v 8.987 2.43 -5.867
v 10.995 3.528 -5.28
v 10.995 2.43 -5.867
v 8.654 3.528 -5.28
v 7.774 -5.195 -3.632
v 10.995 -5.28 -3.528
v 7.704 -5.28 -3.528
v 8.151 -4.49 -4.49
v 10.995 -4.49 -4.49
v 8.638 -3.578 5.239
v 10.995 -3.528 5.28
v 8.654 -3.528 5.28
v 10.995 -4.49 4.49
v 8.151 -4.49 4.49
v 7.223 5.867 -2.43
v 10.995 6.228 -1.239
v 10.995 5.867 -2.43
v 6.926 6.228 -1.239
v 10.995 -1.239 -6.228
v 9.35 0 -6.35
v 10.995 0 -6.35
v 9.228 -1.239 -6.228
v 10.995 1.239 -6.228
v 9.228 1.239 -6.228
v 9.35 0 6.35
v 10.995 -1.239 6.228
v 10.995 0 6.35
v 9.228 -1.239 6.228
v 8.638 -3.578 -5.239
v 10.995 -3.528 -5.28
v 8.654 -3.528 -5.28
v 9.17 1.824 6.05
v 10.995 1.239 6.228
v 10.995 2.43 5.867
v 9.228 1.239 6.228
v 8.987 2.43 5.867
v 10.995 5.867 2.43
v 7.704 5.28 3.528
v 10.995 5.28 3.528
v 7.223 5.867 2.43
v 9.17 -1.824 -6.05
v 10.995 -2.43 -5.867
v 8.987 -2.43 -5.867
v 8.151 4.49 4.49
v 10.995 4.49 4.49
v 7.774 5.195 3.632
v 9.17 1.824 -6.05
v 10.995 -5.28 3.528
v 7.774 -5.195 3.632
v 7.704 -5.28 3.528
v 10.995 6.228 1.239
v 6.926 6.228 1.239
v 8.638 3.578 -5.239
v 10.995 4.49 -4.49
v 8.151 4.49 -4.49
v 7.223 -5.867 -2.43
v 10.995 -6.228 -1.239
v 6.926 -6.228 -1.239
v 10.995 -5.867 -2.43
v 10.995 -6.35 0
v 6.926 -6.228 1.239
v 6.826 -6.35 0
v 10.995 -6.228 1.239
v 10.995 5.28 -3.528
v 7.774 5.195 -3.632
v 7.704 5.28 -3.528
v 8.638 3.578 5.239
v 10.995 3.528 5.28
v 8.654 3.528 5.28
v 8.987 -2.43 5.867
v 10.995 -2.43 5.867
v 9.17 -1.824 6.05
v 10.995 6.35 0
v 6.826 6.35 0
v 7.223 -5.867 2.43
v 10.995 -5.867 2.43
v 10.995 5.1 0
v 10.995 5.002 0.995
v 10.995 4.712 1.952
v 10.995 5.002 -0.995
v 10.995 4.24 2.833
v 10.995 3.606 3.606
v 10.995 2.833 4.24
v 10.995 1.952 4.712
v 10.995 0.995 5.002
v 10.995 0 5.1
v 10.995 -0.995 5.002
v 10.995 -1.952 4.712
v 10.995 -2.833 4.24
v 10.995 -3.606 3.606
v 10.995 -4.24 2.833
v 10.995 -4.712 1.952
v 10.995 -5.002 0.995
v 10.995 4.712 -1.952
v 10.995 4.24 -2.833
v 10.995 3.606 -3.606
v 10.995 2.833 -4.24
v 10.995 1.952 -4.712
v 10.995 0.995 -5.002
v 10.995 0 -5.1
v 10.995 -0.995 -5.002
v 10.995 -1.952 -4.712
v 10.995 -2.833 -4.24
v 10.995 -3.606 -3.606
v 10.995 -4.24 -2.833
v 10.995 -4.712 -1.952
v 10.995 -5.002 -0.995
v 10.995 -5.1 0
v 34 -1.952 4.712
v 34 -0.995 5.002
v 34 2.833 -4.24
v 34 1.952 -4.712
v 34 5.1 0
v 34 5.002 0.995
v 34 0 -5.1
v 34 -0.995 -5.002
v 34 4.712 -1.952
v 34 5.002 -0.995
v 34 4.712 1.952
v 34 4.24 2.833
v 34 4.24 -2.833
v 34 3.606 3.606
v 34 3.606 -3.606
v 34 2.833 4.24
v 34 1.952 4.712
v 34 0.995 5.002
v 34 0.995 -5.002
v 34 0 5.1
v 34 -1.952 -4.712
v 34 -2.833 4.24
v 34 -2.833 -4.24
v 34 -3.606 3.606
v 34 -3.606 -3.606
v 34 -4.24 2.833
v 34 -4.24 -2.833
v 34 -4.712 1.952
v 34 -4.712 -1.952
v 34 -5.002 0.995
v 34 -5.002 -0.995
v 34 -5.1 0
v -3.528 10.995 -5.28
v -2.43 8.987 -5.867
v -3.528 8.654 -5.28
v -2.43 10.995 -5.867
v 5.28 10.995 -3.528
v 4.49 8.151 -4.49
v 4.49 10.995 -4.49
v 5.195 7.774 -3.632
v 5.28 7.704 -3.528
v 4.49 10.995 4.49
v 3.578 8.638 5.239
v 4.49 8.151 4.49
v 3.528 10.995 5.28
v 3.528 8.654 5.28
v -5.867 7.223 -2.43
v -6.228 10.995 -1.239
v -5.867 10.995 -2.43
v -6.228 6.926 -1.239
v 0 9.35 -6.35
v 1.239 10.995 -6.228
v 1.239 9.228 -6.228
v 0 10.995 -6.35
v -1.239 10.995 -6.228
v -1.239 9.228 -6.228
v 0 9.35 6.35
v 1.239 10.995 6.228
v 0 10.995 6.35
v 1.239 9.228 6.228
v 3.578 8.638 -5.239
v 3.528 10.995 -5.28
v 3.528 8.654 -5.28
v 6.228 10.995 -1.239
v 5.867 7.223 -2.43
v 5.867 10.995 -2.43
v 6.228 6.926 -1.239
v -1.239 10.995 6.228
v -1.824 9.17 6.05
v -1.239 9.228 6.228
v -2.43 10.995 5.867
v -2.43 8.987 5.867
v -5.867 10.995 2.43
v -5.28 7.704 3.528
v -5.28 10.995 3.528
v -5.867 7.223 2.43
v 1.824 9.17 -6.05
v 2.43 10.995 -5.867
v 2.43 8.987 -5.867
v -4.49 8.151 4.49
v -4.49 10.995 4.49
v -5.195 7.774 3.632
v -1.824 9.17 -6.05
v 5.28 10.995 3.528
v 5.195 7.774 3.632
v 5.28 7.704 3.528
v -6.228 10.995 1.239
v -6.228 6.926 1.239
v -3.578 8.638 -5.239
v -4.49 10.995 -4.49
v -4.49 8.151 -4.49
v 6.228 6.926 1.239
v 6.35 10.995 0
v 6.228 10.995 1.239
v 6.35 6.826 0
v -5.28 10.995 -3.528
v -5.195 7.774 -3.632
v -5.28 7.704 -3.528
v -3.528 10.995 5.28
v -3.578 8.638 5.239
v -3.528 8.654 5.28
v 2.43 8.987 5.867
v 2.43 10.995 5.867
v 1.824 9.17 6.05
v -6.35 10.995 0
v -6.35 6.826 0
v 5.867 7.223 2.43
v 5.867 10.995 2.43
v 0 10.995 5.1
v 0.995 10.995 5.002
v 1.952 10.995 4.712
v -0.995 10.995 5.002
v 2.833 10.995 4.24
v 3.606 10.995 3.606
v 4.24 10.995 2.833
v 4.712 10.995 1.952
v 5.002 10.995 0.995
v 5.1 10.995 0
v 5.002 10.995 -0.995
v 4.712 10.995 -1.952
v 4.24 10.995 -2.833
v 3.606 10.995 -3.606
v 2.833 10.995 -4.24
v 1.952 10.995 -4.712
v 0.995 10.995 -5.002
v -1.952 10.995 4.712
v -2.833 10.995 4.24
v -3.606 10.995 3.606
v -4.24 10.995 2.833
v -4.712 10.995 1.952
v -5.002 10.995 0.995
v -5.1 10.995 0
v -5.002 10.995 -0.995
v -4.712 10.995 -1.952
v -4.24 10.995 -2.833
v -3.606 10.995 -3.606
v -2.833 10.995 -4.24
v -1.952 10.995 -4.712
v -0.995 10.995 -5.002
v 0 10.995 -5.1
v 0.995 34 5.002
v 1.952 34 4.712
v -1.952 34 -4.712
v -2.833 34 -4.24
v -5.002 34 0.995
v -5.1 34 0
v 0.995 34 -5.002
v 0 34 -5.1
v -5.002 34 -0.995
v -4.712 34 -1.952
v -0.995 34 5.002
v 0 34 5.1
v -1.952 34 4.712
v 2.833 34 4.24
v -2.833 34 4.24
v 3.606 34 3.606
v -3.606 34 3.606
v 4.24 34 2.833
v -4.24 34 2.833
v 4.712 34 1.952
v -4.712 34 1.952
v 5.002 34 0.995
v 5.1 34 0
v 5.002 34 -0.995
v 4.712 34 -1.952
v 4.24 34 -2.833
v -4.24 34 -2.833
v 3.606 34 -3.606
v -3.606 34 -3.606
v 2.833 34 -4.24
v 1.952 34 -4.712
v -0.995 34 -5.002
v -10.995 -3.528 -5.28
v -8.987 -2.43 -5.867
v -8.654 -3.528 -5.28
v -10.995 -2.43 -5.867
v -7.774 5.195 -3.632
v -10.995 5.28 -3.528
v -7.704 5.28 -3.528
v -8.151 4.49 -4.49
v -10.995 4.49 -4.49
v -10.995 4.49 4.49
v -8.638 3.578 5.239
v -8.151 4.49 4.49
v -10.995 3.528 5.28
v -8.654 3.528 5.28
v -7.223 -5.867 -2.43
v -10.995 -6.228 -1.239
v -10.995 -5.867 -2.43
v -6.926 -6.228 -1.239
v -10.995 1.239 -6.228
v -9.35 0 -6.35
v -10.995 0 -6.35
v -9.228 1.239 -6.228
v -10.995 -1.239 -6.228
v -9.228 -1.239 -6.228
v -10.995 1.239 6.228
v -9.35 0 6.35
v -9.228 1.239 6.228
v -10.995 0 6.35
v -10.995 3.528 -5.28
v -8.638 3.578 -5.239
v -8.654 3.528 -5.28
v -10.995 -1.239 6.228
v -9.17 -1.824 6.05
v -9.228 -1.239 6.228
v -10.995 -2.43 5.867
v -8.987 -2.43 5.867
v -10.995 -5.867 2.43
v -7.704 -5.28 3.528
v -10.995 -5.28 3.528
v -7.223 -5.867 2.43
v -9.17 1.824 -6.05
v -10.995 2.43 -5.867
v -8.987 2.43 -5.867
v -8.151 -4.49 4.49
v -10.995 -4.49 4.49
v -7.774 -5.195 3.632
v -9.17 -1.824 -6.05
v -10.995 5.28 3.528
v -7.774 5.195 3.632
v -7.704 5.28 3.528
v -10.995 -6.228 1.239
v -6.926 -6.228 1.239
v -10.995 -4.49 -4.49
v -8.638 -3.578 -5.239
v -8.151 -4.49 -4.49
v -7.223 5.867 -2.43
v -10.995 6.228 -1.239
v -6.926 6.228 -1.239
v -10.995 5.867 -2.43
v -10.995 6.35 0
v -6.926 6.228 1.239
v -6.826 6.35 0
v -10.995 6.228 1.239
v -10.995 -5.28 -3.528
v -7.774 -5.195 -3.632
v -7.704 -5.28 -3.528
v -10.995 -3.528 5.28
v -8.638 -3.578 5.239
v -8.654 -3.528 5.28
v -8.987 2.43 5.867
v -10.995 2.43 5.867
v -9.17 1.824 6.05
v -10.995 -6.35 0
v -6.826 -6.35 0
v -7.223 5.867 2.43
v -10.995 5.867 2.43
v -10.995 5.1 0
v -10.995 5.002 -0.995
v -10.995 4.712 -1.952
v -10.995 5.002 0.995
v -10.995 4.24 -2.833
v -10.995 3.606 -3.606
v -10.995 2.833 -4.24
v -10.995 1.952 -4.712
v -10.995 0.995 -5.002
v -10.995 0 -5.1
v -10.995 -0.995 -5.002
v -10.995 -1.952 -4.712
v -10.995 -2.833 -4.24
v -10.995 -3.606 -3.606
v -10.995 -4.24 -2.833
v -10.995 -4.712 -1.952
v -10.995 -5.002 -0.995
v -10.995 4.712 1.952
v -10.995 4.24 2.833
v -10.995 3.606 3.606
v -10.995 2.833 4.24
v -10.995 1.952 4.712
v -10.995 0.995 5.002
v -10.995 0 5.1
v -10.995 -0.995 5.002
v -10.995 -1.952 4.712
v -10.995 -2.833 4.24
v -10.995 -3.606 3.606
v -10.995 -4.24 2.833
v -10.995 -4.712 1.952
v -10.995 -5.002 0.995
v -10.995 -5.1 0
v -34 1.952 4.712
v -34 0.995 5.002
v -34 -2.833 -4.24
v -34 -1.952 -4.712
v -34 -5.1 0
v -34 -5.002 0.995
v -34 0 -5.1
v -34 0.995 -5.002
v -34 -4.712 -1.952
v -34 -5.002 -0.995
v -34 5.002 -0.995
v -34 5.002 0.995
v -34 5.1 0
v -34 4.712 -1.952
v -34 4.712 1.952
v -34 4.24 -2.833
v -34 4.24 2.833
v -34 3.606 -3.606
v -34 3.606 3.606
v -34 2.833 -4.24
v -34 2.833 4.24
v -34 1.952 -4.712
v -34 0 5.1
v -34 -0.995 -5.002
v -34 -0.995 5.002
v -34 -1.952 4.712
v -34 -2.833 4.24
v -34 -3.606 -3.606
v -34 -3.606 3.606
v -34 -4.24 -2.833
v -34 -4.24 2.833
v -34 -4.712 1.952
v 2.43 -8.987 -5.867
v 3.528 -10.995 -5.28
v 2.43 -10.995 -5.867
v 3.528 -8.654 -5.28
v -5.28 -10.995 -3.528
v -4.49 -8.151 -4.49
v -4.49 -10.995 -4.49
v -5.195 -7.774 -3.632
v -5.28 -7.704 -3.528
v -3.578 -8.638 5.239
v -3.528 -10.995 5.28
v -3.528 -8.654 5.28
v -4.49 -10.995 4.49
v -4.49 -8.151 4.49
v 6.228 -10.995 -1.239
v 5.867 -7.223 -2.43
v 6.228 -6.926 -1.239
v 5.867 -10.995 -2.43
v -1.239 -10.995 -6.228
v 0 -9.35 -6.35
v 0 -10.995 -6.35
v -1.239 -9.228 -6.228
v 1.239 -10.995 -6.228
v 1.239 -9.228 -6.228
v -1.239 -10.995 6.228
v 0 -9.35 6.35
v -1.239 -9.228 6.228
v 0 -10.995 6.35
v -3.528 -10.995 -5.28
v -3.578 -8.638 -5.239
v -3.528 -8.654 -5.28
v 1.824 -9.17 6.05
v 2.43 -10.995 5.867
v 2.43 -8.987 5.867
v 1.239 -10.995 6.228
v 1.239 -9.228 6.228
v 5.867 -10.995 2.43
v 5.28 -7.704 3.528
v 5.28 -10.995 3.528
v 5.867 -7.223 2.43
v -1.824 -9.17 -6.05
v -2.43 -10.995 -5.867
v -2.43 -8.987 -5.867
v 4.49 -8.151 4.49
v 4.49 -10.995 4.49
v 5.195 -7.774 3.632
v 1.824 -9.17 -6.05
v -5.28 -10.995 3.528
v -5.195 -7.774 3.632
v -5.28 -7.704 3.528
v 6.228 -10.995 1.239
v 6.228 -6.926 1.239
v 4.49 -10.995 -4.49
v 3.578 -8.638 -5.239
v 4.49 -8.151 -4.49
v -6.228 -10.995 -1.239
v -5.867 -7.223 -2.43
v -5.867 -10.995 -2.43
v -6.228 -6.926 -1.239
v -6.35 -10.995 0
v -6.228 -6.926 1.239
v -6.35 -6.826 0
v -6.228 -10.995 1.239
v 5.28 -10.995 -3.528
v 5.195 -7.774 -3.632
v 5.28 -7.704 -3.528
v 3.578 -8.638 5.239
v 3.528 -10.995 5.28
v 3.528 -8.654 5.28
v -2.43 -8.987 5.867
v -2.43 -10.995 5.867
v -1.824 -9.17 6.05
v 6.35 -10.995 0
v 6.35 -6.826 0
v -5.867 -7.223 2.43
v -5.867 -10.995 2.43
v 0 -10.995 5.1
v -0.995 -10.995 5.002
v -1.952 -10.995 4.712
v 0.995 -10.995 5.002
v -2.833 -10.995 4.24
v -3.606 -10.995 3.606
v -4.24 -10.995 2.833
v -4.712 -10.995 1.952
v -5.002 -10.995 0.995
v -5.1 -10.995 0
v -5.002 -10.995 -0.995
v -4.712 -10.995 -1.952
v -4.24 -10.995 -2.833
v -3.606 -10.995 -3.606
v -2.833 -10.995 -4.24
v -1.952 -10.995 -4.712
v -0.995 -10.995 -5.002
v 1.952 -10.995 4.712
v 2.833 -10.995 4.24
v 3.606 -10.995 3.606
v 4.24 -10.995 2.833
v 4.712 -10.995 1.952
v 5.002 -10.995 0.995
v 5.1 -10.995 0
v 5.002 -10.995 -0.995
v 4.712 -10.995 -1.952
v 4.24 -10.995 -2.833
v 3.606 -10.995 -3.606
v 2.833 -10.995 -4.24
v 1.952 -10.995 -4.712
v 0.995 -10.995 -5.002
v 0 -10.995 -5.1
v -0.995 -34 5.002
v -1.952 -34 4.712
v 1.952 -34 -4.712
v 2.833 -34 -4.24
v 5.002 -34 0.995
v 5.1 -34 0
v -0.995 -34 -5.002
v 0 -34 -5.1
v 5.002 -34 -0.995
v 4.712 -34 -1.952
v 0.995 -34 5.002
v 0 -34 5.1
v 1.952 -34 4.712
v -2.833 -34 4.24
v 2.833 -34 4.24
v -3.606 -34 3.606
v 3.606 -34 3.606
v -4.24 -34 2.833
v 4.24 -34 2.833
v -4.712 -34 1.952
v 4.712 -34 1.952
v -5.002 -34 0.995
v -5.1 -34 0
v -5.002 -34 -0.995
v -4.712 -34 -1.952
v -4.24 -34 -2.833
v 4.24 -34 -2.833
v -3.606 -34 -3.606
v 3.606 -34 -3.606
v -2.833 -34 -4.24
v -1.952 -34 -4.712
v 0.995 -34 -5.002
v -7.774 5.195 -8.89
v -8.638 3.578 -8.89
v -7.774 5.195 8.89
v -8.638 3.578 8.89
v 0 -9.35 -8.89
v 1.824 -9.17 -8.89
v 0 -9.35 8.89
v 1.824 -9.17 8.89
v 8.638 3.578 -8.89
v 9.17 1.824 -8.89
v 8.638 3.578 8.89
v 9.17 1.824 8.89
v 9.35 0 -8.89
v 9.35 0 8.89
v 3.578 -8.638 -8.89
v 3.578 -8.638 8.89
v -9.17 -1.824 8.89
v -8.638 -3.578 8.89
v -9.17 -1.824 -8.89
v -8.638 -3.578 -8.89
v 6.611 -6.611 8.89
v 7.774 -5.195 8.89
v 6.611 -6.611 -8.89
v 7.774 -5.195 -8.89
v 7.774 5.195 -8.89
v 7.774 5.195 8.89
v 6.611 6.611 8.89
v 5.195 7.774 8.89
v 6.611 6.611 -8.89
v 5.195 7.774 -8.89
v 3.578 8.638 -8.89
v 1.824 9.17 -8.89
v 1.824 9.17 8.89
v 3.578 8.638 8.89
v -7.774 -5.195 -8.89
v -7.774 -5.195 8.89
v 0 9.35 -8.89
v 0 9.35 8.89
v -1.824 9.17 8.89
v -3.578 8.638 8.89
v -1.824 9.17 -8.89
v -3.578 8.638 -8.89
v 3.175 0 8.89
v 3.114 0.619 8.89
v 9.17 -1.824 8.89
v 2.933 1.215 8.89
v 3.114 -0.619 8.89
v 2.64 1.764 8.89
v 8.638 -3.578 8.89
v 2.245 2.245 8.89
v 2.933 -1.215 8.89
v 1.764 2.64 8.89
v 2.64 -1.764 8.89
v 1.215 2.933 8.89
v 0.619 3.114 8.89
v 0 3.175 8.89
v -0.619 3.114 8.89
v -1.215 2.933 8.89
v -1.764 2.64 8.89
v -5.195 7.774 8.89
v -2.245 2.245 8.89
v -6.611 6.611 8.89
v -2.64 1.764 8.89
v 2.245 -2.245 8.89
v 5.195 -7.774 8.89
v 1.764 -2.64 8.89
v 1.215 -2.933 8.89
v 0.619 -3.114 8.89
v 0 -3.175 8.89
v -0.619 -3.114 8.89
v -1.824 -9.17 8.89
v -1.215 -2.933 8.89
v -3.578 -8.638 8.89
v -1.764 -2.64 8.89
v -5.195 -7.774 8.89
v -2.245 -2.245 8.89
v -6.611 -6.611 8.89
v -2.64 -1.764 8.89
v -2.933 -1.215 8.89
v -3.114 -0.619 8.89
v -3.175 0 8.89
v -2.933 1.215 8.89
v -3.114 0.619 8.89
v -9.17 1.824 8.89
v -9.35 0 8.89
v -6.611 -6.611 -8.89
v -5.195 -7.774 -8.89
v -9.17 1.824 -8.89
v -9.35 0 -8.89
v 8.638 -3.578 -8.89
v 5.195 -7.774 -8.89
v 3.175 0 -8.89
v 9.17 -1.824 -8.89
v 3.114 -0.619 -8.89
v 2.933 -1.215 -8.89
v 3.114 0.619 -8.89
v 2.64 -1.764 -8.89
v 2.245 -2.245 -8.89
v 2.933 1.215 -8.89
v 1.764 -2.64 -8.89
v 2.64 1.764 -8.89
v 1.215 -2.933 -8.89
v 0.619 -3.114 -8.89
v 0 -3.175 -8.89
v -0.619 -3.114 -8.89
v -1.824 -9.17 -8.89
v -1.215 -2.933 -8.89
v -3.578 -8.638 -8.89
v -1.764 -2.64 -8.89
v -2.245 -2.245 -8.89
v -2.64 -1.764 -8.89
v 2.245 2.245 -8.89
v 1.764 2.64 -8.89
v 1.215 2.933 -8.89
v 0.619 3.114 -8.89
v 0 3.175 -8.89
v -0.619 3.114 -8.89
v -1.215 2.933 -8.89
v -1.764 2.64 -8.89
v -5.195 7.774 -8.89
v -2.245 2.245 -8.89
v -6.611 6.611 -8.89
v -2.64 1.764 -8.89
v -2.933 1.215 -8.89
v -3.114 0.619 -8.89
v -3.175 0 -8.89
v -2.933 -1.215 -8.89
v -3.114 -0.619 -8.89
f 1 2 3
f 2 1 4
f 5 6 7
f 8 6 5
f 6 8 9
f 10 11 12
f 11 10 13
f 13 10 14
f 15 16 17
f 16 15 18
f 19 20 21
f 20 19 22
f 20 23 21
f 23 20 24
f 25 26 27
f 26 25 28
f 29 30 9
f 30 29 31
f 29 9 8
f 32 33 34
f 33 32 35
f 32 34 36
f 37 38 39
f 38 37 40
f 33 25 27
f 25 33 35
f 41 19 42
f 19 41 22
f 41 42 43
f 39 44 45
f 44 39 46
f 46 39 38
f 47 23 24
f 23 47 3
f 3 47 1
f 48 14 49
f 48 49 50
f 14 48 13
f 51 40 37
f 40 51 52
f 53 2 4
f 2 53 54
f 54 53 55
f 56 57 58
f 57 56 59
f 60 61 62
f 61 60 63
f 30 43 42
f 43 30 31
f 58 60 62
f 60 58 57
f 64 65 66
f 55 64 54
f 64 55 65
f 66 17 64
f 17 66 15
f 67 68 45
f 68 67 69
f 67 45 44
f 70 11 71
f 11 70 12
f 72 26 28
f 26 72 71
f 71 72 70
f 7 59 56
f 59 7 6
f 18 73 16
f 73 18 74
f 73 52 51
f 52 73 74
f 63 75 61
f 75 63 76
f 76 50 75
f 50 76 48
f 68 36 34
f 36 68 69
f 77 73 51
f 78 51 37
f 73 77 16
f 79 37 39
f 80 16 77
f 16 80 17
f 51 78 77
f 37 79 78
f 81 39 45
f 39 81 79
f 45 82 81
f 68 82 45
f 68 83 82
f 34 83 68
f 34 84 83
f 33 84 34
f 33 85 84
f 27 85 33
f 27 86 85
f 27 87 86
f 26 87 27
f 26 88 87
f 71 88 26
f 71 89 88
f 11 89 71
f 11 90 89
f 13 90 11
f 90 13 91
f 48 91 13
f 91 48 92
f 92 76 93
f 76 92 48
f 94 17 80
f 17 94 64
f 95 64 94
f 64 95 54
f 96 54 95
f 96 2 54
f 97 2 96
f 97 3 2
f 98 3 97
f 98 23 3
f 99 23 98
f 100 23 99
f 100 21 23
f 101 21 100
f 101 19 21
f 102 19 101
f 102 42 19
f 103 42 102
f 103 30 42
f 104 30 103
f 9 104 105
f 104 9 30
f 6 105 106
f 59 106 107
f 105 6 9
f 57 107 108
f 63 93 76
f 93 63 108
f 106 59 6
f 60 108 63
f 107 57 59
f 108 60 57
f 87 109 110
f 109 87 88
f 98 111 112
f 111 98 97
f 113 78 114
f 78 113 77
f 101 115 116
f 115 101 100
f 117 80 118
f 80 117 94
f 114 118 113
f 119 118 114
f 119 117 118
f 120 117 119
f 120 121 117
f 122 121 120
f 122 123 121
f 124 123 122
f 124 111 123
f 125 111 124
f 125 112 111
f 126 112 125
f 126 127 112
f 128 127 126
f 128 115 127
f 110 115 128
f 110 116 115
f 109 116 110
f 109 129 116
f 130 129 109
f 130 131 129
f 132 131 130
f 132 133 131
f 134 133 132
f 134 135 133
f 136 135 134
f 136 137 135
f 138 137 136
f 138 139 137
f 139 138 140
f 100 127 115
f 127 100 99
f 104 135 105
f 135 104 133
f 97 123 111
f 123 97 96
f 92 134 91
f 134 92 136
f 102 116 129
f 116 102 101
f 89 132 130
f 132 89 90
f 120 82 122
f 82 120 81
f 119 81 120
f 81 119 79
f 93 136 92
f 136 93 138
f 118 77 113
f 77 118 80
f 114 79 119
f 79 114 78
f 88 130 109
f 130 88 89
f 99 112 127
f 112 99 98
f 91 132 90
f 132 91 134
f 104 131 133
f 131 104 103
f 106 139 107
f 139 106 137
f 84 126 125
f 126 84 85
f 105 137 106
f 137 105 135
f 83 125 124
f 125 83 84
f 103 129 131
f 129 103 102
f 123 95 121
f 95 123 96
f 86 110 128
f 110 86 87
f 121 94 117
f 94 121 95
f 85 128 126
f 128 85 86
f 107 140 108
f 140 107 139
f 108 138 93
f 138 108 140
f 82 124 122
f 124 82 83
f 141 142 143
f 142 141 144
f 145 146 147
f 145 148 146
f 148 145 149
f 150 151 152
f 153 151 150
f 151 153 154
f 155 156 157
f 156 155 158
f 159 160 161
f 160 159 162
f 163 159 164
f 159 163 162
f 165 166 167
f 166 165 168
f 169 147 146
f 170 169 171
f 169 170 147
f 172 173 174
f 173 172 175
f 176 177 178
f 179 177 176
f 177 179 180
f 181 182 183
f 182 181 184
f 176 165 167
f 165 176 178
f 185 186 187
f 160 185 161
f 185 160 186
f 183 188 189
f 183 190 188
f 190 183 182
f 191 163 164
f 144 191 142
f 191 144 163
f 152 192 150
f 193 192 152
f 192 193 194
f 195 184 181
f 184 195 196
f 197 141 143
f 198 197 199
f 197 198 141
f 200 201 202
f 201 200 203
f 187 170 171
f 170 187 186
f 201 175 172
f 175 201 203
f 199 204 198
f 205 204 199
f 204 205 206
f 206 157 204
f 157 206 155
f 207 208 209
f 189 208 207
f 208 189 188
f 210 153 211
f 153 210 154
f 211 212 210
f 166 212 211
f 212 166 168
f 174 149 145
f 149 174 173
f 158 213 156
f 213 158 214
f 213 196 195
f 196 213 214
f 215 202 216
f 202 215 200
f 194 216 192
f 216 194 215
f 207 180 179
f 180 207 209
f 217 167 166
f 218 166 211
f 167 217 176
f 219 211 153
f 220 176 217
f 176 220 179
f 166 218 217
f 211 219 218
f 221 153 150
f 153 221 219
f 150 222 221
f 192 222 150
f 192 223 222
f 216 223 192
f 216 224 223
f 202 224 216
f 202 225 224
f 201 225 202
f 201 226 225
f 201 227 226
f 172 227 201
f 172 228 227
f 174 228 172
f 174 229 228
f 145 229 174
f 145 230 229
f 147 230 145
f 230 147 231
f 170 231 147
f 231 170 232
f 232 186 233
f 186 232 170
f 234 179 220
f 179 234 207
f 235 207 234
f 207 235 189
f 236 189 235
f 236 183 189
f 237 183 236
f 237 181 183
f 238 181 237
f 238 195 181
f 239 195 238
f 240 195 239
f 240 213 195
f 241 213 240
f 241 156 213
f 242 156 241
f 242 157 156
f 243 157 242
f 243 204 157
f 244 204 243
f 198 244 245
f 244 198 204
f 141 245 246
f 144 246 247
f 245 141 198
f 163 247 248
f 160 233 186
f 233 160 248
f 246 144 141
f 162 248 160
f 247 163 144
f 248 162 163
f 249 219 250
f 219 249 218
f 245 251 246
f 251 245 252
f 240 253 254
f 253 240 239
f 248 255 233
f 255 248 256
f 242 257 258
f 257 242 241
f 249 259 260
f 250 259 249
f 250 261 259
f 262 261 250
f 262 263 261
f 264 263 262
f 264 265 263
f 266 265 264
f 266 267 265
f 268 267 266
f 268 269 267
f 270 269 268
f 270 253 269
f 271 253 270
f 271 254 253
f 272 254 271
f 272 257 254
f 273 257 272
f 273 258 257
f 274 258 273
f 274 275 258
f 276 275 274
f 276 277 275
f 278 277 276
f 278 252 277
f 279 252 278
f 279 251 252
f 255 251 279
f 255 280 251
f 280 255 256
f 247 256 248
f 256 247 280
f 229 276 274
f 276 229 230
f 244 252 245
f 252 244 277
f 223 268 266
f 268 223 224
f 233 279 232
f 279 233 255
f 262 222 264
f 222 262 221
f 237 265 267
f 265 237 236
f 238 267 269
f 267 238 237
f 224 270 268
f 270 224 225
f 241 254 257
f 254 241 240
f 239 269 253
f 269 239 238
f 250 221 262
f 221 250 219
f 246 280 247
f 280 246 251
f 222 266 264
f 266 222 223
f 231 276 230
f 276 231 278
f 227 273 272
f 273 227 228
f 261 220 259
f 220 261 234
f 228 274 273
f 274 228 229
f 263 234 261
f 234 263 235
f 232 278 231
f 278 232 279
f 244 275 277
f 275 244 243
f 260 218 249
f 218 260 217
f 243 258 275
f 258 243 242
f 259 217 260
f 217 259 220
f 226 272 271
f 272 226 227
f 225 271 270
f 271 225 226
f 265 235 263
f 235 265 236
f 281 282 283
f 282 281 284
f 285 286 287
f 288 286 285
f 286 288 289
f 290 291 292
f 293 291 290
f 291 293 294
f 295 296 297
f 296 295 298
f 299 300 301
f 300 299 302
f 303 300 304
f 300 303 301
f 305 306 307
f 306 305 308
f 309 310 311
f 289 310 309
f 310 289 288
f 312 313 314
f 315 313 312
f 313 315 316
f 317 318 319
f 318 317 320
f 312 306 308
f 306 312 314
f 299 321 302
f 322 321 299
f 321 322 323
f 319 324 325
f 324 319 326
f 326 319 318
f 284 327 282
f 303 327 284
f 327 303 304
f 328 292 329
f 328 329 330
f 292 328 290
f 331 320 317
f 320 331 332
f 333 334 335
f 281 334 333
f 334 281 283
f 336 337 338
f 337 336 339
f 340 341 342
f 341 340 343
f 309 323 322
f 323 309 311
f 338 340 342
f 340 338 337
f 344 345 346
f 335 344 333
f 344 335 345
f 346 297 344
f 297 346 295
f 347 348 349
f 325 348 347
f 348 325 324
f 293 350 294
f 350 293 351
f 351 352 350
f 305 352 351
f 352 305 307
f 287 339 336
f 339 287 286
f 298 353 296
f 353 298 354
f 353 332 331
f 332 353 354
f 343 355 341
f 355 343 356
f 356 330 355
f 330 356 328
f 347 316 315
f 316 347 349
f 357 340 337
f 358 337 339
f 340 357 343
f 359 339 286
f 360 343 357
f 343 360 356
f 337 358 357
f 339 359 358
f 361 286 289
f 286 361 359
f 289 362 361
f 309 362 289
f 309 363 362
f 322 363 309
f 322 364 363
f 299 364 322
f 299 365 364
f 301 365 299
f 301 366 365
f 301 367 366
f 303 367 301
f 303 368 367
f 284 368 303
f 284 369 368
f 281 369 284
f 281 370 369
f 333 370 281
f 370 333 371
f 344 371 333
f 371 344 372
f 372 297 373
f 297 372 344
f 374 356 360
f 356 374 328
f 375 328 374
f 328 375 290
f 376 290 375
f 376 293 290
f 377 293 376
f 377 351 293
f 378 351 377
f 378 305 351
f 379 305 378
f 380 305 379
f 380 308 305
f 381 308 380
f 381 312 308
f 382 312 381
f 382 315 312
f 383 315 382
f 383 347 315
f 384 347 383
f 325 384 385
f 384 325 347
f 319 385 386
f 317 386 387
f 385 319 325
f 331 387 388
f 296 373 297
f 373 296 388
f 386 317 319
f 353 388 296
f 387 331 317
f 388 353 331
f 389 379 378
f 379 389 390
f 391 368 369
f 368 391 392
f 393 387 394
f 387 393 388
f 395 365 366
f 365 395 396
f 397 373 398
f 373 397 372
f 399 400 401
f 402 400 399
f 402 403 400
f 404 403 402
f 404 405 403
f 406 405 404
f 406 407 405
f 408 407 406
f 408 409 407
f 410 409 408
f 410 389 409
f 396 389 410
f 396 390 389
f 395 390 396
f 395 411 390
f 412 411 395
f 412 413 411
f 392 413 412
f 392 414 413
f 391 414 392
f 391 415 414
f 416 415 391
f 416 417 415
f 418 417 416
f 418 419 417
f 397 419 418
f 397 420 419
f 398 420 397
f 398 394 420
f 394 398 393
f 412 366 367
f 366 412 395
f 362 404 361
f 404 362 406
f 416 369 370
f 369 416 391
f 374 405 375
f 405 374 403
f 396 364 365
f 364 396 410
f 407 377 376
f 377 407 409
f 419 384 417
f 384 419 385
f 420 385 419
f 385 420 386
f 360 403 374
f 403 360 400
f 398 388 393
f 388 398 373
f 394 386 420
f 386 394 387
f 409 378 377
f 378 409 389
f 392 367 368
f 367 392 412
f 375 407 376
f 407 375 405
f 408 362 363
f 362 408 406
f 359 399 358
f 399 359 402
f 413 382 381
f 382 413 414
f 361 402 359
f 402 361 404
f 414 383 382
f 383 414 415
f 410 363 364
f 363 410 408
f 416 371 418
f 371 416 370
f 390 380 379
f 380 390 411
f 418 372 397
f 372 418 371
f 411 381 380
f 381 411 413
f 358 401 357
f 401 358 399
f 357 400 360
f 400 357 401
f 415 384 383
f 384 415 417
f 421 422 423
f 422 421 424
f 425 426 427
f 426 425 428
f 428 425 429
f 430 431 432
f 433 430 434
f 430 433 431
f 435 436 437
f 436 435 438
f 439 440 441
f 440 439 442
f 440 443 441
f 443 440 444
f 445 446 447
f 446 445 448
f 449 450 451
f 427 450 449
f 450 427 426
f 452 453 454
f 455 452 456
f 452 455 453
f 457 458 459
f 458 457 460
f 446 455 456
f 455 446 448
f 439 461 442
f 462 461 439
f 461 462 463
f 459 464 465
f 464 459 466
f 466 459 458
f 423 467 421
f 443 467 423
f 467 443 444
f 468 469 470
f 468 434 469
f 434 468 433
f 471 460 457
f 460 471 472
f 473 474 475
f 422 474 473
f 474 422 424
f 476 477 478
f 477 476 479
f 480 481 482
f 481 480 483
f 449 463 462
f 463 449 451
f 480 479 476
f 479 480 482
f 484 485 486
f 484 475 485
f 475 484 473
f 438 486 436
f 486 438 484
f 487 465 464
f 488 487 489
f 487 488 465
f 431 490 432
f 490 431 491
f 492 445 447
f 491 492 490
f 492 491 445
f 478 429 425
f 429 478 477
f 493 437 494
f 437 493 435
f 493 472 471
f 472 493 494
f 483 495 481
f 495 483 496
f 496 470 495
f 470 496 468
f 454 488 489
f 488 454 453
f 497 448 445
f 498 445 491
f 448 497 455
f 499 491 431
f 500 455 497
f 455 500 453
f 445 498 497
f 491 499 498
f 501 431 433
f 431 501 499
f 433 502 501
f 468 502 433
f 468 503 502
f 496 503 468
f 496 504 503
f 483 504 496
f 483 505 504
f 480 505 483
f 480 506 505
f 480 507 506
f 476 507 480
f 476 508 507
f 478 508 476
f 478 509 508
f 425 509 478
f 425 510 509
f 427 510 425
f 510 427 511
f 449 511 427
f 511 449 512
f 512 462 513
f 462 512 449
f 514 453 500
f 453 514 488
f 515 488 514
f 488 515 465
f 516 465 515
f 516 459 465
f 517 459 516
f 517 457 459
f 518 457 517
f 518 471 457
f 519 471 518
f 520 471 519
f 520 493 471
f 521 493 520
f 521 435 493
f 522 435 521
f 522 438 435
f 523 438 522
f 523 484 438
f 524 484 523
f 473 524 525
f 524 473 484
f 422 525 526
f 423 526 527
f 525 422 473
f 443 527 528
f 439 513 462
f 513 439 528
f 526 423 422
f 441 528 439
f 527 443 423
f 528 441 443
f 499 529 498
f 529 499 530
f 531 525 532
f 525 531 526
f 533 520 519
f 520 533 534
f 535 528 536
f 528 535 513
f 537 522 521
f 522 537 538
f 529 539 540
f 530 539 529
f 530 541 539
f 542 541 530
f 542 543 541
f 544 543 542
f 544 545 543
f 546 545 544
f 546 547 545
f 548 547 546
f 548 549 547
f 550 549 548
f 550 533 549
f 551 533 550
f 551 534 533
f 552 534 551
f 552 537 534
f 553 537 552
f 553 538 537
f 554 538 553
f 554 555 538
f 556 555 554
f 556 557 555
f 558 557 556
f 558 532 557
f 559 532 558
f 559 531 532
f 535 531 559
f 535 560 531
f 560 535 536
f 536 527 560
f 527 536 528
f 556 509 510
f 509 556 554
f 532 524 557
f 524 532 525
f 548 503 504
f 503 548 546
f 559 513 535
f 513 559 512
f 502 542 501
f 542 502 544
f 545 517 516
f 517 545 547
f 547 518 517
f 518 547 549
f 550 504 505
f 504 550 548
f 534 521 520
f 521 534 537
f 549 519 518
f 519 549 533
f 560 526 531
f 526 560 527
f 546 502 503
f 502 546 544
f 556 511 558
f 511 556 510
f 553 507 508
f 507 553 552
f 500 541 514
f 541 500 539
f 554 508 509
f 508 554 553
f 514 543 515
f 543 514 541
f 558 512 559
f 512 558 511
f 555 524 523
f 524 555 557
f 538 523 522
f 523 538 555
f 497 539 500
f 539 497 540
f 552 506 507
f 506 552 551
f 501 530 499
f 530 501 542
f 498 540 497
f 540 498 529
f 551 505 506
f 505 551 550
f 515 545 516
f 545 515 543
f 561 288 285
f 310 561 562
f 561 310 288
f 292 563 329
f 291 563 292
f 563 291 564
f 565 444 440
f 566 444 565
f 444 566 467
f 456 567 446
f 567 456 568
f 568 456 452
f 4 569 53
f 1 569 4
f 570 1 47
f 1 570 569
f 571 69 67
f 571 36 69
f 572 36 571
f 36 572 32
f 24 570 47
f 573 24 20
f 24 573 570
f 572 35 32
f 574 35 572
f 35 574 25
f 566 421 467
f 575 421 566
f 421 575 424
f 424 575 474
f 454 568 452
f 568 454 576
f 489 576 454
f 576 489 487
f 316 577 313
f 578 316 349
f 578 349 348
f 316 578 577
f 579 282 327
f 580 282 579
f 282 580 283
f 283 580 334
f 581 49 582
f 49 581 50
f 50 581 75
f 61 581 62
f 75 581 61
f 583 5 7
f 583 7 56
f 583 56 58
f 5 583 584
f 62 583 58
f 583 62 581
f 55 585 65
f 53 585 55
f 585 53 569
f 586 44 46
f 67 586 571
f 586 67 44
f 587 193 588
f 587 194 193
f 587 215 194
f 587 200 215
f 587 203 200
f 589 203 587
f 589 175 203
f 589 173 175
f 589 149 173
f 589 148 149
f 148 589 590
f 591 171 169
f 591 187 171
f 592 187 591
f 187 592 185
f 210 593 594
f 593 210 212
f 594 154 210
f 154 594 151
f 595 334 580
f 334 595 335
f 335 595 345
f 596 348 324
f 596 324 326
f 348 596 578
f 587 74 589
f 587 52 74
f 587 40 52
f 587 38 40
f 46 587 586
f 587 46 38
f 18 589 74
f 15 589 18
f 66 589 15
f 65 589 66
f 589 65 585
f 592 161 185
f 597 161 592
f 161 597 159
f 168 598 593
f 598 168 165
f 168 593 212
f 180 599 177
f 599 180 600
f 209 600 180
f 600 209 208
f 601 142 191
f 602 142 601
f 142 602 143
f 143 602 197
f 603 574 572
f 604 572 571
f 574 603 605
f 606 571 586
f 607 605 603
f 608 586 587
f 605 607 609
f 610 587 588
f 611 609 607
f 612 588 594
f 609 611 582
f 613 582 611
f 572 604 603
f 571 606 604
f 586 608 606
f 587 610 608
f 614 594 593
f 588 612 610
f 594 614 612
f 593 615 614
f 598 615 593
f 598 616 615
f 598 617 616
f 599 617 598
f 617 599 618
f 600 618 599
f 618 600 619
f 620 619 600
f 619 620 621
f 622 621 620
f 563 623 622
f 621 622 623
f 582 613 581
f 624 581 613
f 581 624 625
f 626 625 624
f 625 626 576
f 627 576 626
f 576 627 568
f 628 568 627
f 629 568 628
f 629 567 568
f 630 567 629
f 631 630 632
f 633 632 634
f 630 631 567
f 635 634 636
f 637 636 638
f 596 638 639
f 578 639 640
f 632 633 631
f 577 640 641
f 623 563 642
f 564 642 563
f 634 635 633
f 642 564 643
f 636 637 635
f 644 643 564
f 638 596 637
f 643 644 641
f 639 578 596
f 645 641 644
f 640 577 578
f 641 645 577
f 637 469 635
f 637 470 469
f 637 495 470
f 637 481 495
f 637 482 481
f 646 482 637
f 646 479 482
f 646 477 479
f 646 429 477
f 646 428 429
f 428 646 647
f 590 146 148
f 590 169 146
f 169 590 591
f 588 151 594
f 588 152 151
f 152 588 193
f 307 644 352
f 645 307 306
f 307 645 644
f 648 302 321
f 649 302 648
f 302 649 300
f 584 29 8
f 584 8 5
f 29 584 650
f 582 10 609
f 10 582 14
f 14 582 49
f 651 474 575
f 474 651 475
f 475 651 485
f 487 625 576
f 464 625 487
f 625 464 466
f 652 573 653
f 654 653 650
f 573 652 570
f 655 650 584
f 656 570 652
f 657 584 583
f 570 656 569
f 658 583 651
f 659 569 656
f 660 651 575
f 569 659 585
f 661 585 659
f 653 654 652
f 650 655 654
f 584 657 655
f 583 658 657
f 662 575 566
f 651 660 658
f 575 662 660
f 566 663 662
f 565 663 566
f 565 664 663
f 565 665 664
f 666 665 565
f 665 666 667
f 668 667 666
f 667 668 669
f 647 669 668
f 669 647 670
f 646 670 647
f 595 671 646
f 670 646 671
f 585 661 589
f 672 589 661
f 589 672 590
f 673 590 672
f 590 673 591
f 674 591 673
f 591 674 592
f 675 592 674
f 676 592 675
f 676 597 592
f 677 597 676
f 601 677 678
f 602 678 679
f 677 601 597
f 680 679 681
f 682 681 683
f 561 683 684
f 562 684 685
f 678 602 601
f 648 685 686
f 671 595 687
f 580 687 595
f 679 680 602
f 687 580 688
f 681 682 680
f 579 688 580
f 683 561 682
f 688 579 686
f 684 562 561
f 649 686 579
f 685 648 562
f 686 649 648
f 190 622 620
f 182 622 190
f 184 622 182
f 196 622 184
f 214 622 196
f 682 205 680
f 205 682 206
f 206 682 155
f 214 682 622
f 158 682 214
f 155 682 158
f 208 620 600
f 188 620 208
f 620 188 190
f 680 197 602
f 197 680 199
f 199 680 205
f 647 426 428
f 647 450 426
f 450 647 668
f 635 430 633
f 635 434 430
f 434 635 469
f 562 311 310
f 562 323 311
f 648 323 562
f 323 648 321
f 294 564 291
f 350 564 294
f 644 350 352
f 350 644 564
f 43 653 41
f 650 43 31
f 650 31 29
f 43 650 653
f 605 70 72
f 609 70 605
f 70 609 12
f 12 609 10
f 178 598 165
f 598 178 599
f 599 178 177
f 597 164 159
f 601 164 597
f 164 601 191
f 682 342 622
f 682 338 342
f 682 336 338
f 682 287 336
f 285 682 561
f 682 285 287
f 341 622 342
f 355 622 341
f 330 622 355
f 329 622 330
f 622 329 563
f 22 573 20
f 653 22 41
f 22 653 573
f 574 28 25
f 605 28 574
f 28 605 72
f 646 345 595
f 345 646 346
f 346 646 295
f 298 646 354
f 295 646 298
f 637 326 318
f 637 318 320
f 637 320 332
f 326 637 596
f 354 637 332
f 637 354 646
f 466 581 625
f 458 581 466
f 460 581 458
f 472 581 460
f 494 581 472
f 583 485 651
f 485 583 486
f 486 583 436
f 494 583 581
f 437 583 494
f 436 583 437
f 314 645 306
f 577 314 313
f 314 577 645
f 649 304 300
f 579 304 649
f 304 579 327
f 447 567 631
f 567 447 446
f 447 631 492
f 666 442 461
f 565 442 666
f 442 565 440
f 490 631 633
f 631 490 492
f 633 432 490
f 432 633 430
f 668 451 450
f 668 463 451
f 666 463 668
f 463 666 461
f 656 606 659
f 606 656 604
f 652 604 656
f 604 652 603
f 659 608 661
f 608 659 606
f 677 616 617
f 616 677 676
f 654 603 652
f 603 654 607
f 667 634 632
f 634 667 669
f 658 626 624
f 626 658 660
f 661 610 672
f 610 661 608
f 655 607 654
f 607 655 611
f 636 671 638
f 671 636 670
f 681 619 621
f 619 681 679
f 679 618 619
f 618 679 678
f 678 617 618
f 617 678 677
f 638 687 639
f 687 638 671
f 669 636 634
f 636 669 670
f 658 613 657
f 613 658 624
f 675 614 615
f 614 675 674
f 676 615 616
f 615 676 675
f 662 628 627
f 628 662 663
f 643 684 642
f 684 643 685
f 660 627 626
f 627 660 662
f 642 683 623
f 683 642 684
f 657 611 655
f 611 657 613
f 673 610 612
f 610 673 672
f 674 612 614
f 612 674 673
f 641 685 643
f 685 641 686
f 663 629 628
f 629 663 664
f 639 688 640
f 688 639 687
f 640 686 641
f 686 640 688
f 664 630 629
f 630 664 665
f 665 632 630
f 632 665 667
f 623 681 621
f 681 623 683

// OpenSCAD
$fn = 32;

// ----------------------------------------------------------------------
// Cardan cross: 68 mm span, 12.7 mm trunnions
// ----------------------------------------------------------------------

// --- parameters (mm) ---
journal_d = 12.7;         // trunnion diameter
arm_len = 34;             // trunnion length from the centre
step_r = 4.32;            // step position from the centre
step_d = 10.2;            // journal diameter after the step
hub_d = 18.7;             // hub diameter
hub_h = 17.78;            // hub height
bore_d = 6.35;            // hub bore

difference() {
  union() {
    /* hub along the joint axis */
    cylinder(h = hub_h, d = hub_d, center = true);
    for (a = [0 : 90 : 270]) rotate([0, 0, a]) {
      /* trunnion, sunk into the hub */
      translate([hub_d / 4, 0, 0]) rotate([0, 90, 0]) cylinder(h = step_r + 2, d = journal_d);
      /* stepped journal out to the tip */
      translate([step_r - 0.5, 0, 0]) rotate([0, 90, 0]) cylinder(h = arm_len + 0.5 - step_r, d = step_d);
    }
  }
  /* lubrication bore through the hub, 2.5 mm clear on both sides */
  translate([0, 0, -hub_h / 2 - 2.5]) cylinder(h = hub_h + 5, d = bore_d);
}
